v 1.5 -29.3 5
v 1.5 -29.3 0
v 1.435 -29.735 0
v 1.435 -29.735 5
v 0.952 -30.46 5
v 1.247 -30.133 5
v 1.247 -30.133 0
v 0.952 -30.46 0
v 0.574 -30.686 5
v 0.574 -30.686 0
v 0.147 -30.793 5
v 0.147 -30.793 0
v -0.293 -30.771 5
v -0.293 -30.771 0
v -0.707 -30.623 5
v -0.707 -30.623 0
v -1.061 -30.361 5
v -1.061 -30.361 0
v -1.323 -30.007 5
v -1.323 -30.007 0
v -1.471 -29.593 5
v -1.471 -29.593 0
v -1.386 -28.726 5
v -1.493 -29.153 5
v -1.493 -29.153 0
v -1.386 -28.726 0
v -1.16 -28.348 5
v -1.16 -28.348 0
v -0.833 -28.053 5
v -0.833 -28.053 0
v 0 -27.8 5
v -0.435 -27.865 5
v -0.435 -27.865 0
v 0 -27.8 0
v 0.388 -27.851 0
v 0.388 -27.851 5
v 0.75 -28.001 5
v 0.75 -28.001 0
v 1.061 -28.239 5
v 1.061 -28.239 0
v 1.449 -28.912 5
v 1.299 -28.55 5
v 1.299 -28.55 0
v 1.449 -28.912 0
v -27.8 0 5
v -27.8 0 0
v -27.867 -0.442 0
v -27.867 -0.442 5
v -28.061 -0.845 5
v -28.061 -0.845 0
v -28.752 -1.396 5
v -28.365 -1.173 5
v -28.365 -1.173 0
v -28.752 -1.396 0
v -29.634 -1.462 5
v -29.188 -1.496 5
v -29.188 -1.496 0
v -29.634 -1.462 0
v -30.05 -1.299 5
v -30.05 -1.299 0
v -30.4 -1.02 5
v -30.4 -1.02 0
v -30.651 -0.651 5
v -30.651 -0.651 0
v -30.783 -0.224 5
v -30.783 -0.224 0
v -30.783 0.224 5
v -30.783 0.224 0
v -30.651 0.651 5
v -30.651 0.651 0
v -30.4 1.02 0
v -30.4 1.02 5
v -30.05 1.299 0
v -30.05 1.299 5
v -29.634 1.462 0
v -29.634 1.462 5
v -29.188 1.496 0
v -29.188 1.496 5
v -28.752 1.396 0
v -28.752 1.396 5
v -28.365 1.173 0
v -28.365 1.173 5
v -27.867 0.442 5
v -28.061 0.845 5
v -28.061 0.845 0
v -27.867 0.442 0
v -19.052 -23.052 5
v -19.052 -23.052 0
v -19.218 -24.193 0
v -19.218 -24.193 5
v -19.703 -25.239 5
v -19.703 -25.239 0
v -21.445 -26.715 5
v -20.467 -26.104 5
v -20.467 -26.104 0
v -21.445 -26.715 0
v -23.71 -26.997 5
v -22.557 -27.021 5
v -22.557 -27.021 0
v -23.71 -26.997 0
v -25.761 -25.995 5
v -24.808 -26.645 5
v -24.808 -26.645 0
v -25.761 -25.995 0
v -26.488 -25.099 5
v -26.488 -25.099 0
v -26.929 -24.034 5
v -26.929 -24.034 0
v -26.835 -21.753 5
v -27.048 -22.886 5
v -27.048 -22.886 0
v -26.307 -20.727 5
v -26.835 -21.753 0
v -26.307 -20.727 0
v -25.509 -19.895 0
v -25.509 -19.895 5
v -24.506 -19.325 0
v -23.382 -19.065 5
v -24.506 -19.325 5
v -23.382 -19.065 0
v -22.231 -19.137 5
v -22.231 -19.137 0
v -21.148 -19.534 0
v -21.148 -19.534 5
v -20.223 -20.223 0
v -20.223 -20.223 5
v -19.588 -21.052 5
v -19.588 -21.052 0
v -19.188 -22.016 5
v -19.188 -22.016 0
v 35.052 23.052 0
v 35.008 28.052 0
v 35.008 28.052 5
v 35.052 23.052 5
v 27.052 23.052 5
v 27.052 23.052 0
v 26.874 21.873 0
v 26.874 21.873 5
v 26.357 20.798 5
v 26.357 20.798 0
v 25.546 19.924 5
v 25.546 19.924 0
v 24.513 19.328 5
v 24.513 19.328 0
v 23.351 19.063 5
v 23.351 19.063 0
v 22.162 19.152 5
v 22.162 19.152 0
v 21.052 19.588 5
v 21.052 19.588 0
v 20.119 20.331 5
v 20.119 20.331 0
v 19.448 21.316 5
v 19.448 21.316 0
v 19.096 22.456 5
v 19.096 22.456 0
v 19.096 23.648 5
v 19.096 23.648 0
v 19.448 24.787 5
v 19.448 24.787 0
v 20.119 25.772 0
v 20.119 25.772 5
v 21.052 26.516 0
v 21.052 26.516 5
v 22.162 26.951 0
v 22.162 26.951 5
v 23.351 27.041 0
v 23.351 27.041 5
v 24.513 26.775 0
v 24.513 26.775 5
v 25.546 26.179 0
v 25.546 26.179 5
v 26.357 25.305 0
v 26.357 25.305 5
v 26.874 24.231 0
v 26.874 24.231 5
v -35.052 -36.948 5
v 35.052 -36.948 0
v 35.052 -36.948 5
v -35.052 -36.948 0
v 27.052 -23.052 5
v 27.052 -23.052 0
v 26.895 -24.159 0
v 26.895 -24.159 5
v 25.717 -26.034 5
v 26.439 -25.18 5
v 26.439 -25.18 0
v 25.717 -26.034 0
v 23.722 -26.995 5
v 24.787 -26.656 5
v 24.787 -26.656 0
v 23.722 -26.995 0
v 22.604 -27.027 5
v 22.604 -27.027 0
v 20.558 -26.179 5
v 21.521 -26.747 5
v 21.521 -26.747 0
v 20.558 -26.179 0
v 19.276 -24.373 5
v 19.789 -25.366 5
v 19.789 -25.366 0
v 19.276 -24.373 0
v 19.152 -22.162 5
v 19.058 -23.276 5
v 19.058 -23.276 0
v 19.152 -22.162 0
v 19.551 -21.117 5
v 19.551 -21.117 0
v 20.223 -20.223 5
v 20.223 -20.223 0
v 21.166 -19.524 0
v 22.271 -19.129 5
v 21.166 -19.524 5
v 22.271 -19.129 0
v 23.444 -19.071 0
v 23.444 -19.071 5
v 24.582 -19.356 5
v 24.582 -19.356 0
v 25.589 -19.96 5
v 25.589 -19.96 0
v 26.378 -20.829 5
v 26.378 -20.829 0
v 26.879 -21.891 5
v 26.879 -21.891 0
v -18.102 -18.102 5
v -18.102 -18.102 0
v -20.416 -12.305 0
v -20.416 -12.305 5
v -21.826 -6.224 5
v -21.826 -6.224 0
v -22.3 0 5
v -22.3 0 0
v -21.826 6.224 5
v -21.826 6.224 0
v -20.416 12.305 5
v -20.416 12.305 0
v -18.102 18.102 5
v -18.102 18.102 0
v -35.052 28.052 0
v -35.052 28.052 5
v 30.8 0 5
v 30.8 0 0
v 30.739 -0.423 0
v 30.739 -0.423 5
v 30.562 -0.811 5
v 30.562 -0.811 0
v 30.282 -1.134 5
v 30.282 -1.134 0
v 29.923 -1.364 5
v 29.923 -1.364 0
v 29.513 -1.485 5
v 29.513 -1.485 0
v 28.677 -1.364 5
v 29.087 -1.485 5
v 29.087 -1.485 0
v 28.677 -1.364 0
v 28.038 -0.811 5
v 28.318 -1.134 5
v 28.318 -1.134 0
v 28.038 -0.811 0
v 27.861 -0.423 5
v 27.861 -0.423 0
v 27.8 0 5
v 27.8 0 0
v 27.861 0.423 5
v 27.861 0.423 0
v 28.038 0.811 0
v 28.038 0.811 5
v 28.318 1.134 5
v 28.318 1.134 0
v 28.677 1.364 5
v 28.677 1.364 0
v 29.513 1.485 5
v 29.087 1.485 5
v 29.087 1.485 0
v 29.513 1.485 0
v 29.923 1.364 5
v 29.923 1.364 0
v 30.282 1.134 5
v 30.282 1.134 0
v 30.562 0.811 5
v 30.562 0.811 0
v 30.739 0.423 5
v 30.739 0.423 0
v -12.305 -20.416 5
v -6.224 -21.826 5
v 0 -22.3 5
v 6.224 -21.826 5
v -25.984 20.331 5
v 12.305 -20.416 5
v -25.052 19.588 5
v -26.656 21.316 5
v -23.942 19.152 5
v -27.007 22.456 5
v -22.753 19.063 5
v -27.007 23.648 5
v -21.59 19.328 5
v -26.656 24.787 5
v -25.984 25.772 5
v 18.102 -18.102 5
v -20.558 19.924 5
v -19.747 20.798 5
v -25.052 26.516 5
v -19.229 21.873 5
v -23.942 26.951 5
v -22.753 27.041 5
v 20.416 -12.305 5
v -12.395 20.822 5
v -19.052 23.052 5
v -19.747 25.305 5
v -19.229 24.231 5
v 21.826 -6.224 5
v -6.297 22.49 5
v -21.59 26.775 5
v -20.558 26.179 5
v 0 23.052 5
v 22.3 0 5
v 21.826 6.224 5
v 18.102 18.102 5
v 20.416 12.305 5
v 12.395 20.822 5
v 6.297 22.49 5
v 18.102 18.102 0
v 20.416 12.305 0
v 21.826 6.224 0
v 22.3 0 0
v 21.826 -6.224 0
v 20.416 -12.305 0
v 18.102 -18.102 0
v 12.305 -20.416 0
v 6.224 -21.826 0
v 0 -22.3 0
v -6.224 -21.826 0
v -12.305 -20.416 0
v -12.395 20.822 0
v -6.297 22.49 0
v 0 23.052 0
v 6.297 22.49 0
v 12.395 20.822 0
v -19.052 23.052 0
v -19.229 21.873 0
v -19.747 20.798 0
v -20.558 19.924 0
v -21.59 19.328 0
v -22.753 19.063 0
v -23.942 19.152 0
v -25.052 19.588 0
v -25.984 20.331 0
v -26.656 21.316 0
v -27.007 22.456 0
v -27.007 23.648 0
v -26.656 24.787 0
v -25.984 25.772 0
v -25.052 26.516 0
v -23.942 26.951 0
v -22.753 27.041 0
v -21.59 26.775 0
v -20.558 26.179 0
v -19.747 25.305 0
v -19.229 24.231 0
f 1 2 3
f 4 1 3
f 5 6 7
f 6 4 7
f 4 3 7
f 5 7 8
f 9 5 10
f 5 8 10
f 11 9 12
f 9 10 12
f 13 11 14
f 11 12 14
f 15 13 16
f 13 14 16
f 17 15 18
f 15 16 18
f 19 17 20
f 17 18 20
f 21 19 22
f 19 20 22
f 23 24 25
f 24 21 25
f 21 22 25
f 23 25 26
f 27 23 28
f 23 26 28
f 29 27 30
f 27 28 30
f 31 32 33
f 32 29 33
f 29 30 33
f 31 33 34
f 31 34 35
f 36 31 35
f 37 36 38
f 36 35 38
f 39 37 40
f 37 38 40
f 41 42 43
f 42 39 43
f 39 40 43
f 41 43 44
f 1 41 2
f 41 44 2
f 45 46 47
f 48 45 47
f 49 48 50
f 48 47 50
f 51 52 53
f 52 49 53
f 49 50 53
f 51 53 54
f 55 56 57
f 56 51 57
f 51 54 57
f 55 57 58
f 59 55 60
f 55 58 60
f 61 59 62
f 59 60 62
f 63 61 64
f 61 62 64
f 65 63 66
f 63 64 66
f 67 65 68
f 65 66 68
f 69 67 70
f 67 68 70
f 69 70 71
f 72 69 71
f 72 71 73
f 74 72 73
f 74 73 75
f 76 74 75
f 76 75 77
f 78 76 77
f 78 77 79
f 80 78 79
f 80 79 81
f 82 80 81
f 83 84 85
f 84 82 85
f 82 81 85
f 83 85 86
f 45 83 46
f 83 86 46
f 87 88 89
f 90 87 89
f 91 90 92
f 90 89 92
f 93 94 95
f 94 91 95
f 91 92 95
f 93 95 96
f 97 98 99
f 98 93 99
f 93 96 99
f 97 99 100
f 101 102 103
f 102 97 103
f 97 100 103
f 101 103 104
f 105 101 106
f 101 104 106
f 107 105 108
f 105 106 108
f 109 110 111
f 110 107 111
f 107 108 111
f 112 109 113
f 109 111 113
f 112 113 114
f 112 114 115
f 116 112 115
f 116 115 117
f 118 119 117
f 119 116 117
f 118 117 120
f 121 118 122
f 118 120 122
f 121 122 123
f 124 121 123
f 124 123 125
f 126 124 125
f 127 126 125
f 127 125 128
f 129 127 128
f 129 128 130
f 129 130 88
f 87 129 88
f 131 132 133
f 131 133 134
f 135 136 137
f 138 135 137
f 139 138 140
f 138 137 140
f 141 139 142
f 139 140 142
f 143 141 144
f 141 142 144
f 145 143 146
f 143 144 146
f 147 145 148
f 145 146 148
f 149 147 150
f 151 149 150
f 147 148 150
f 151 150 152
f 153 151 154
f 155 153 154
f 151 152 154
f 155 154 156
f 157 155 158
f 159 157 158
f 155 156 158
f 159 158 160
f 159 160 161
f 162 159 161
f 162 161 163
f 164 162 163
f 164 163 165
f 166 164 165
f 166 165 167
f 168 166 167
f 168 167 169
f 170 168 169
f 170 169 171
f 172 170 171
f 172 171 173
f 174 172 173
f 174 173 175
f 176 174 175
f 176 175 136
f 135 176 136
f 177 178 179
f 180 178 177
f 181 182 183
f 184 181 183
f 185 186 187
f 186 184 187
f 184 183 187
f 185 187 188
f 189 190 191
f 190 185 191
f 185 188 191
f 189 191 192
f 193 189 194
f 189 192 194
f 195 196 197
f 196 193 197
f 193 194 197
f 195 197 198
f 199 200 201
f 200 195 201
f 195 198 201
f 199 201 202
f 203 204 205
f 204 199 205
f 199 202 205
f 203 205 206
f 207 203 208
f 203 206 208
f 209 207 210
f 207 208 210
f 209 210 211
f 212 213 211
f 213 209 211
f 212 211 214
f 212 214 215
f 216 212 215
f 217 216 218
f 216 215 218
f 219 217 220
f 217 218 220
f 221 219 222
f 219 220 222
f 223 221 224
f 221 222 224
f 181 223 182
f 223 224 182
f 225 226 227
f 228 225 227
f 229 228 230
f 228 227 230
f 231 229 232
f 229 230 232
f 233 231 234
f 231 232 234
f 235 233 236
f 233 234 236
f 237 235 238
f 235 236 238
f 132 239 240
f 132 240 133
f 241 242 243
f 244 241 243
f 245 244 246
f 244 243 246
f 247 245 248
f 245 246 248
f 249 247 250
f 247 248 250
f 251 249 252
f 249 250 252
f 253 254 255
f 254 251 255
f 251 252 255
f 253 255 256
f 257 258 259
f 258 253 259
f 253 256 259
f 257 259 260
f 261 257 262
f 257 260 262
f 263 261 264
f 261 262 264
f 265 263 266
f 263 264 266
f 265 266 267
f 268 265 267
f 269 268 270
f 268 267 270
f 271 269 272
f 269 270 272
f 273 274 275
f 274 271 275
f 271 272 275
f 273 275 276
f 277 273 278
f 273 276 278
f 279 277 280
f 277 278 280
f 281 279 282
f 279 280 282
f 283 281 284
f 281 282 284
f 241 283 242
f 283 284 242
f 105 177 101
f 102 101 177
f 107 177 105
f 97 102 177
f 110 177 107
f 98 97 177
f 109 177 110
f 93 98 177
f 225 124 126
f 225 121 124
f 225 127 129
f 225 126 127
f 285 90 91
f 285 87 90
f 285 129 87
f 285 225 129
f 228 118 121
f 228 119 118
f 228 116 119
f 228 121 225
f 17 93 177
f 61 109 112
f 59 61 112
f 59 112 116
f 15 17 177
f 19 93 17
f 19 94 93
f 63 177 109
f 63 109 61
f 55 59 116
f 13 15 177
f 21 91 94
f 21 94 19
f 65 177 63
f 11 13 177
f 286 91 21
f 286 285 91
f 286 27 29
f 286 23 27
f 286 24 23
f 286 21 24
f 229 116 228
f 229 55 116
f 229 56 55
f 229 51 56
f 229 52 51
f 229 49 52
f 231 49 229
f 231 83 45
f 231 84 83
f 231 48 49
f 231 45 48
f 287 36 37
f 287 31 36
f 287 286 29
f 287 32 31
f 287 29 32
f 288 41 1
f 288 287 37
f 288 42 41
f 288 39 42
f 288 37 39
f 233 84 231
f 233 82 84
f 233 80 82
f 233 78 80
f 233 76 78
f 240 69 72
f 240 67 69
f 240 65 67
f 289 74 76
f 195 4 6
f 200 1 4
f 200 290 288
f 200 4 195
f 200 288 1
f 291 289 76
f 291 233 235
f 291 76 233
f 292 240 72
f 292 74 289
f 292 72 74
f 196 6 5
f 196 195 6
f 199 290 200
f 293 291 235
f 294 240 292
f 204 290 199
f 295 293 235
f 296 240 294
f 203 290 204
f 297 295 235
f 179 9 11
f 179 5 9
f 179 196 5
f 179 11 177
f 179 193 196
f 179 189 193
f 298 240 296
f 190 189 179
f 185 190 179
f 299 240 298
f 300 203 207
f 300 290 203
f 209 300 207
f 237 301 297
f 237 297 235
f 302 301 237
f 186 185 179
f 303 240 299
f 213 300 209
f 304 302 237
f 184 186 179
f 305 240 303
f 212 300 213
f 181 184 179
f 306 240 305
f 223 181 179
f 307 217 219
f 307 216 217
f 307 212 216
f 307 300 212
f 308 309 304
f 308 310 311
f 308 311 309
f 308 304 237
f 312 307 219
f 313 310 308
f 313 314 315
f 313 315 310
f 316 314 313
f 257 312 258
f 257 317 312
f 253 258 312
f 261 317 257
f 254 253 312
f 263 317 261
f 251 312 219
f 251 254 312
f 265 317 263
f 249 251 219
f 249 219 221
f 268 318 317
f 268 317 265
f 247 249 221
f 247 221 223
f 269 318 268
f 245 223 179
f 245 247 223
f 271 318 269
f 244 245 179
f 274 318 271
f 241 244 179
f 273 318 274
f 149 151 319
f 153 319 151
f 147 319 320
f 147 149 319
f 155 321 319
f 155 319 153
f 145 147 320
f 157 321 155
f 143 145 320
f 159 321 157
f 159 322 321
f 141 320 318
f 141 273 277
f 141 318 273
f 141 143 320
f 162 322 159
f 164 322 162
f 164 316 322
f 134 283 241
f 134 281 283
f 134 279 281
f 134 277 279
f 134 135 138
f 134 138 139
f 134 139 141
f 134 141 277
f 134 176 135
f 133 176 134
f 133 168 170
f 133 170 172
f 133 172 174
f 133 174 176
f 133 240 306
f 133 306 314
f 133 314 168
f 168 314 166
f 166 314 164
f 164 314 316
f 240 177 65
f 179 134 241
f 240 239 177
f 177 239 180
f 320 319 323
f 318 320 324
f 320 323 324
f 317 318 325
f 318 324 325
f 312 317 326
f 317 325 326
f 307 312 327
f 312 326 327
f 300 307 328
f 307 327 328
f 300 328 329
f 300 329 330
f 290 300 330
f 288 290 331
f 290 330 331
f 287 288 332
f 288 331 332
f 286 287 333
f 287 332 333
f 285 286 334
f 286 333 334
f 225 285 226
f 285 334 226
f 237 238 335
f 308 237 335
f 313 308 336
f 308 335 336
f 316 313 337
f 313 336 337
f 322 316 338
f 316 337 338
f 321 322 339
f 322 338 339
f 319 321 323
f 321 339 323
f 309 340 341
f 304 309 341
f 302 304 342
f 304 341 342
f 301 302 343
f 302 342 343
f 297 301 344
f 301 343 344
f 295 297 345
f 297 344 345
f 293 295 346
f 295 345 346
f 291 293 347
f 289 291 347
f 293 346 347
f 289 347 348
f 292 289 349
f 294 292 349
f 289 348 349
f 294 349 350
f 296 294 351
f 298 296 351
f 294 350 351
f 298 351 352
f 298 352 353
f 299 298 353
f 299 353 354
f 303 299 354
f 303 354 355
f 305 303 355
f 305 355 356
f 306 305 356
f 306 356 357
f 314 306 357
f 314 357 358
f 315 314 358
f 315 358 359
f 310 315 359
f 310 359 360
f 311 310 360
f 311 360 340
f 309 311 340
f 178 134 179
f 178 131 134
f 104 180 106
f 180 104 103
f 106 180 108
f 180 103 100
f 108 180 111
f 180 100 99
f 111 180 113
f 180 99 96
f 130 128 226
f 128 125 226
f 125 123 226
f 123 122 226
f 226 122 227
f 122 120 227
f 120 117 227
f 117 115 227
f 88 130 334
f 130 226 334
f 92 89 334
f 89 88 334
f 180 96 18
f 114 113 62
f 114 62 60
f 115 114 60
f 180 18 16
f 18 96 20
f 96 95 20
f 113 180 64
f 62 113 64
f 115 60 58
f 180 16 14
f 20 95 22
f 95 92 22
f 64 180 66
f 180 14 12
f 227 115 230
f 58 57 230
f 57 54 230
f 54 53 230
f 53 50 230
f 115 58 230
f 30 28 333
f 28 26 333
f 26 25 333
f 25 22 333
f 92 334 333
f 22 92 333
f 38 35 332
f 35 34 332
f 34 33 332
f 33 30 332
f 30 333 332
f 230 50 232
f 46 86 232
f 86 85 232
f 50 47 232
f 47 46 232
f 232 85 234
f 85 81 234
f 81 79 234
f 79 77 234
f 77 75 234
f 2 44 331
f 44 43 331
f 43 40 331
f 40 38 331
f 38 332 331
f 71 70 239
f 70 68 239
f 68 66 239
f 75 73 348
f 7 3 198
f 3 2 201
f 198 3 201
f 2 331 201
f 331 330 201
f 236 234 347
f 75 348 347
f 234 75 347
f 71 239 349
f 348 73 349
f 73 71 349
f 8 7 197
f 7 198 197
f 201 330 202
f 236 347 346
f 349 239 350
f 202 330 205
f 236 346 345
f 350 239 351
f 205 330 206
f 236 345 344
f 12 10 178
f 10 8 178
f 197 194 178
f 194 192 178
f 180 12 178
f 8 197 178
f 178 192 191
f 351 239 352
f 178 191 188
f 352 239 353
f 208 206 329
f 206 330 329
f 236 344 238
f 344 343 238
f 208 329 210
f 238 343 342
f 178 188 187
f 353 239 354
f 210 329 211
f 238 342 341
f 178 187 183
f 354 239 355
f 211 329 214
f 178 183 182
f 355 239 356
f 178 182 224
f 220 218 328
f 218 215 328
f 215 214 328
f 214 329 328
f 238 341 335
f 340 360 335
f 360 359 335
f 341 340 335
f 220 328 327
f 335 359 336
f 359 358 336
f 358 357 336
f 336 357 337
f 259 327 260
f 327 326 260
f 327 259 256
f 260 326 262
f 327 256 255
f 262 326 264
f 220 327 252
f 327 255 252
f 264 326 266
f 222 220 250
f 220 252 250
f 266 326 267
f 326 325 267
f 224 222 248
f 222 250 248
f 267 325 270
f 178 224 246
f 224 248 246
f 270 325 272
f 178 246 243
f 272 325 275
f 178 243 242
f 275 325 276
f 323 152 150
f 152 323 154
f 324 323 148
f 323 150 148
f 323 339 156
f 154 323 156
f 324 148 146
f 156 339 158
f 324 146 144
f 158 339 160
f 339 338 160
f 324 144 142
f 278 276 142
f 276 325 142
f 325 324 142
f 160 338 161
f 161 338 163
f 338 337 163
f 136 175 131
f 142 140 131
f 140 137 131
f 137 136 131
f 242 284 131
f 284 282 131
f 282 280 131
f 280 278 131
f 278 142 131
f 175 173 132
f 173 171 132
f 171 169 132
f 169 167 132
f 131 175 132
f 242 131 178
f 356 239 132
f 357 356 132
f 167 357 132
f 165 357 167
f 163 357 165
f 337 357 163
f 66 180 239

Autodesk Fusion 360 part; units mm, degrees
sketch "Sketch1" plane through (0, 0, 0) normal (0, 0, 1) x (1, 0, 0)
  circle A0 centre (0, 0) radius 21.3
  line L0 (0, 0) -> (-15.0614, -15.0614)
  line L1 (0, 0) -> (21.3, 0) construction
  line L2 (-15.0614, -15.0614) -> (-23.0517, -23.0517)
  circle A1 centre (-23.0517, -23.0517) radius 11
  line L3 (0, 0) -> (15.0614, -15.0614)
  line L4 (15.0614, -15.0614) -> (23.0517, -23.0517)
  circle A2 centre (23.0517, -23.0517) radius 11
  circle A3 centre (-23.0517, 23.0517) radius 11
  circle A4 centre (23.0517, 23.0517) radius 11
  line L5 (-23.0517, 23.0517) -> (-35.0517, 23.0517)
  line L6 (-35.0517, 23.0517) -> (-35.0517, -36.9483)
  line L7 (23.0517, 23.0517) -> (35.0517, 23.0517)
  line L8 (35.0517, 23.0517) -> (35.0517, -36.9483)
  line L9 (35.0517, -36.9483) -> (-35.0517, -36.9483)
  line L10 (-23.0517, 23.0517) -> (23.0517, 23.0517)
  circle A5 centre (-23.0517, 23.0517) radius 4
  circle A6 centre (23.0517, 23.0517) radius 4
  circle A7 centre (23.0517, -23.0517) radius 4
  circle A8 centre (-23.0517, -23.0517) radius 4
  line L11 (-35.0517, 23.0517) -> (-35.0517, 24)
  line L12 (-35.0517, 24) -> (-35.0517, 28.0517)
  line L13 (-35.0517, 28.0517) -> (35.0082, 28.0517)
  line L14 (35.0082, 28.0517) -> (35.0517, 23.0517)
  line L15 (-23.0517, -23.0517) -> (-18.1019, -18.1019)
  line L16 (-23.0517, 23.0517) -> (-18.1019, 18.1019)
  line L17 (23.0517, 23.0517) -> (18.1019, 18.1019)
  line L18 (23.0517, 23.0517) -> (30.0517, 23.0517) construction
  line L19 (23.0517, -23.0517) -> (18.1019, -18.1019)
  arc A9 (18.1019, 18.1019) -> (-18.1019, 18.1019) centre (0, -12.5239) ccw
  line L20 (0, 0) -> (-21.3, 0)
  line L21 (-21.3, 0) -> (-22.3, 0)
  arc A10 (-18.1019, 18.1019) -> (-18.1019, -18.1019) centre (18.8265, 0) ccw
  line L22 (0, 0) -> (0, 5) construction
  arc A11 (18.1019, -18.1019) -> (18.1019, 18.1019) centre (-18.8265, 0) ccw
  line L23 (0, 0) -> (0, -21.3)
  line L24 (0, -21.3) -> (0, -22.3)
  arc A12 (-18.1019, -18.1019) -> (18.1019, -18.1019) centre (0, 18.8265) ccw
  line L25 (0, 0) -> (0, -21.3)
  line L26 (0, -21.3) -> (0, -29.3)
  line L27 (-21.3, 0) -> (-29.3, 0)
  line L28 (21.3, 0) -> (29.3, 0)
  circle A13 centre (29.3, 0) radius 1.5
  circle A14 centre (0, -29.3) radius 1.5
  circle A15 centre (-29.3, 0) radius 1.5
  dimension "d1" = 42.6
  dimension "d2" = 135
  dimension "d3" = 11.3
  dimension "d4" = 22
  dimension "d5" = 11.3
  dimension "d6" = 22
  dimension "d7" = 12
  dimension "d8" = 60
  dimension "d9" = 12
  dimension "d10" = 60
  dimension "d11" = 8
  dimension "d12" = 8
  dimension "d13" = 8
  dimension "d14" = 8
  dimension "d15" = 5
  dimension "d16" = 7
  dimension "d17" = 7
  dimension "d18" = 135
  dimension "d19" = 7
  dimension "d20" = 7
  dimension "d25" = 1
  dimension "d26" = 1
  dimension "d27" = 8
  dimension "d28" = 8
  dimension "d29" = 8
  dimension "d30" = 3
  dimension "d31" = 3
  dimension "d32" = 3
extrude "Extrude1" add sketch "Sketch1" along normal blind 5 contours A1 A2 A3 A4 L5 L6 L7 L8 L9 A10 A11 A12 | A2 A11 A12 | A4 L7 A6 L17 A11 | A3 L5 A5 L16 A10 | A1 A10 A12 | A4 L10 A9 | A4 L10 A6 L17 A9 | A4 L7 L10 A6 L13 | A4 L7 L13 L14 | A3 L5 L11 L12 L13 | A3 L5 L10 A5 L13 | A3 L10 A5 L16 A9 | A3 L10 A9 | A3 A4 L10 L13
